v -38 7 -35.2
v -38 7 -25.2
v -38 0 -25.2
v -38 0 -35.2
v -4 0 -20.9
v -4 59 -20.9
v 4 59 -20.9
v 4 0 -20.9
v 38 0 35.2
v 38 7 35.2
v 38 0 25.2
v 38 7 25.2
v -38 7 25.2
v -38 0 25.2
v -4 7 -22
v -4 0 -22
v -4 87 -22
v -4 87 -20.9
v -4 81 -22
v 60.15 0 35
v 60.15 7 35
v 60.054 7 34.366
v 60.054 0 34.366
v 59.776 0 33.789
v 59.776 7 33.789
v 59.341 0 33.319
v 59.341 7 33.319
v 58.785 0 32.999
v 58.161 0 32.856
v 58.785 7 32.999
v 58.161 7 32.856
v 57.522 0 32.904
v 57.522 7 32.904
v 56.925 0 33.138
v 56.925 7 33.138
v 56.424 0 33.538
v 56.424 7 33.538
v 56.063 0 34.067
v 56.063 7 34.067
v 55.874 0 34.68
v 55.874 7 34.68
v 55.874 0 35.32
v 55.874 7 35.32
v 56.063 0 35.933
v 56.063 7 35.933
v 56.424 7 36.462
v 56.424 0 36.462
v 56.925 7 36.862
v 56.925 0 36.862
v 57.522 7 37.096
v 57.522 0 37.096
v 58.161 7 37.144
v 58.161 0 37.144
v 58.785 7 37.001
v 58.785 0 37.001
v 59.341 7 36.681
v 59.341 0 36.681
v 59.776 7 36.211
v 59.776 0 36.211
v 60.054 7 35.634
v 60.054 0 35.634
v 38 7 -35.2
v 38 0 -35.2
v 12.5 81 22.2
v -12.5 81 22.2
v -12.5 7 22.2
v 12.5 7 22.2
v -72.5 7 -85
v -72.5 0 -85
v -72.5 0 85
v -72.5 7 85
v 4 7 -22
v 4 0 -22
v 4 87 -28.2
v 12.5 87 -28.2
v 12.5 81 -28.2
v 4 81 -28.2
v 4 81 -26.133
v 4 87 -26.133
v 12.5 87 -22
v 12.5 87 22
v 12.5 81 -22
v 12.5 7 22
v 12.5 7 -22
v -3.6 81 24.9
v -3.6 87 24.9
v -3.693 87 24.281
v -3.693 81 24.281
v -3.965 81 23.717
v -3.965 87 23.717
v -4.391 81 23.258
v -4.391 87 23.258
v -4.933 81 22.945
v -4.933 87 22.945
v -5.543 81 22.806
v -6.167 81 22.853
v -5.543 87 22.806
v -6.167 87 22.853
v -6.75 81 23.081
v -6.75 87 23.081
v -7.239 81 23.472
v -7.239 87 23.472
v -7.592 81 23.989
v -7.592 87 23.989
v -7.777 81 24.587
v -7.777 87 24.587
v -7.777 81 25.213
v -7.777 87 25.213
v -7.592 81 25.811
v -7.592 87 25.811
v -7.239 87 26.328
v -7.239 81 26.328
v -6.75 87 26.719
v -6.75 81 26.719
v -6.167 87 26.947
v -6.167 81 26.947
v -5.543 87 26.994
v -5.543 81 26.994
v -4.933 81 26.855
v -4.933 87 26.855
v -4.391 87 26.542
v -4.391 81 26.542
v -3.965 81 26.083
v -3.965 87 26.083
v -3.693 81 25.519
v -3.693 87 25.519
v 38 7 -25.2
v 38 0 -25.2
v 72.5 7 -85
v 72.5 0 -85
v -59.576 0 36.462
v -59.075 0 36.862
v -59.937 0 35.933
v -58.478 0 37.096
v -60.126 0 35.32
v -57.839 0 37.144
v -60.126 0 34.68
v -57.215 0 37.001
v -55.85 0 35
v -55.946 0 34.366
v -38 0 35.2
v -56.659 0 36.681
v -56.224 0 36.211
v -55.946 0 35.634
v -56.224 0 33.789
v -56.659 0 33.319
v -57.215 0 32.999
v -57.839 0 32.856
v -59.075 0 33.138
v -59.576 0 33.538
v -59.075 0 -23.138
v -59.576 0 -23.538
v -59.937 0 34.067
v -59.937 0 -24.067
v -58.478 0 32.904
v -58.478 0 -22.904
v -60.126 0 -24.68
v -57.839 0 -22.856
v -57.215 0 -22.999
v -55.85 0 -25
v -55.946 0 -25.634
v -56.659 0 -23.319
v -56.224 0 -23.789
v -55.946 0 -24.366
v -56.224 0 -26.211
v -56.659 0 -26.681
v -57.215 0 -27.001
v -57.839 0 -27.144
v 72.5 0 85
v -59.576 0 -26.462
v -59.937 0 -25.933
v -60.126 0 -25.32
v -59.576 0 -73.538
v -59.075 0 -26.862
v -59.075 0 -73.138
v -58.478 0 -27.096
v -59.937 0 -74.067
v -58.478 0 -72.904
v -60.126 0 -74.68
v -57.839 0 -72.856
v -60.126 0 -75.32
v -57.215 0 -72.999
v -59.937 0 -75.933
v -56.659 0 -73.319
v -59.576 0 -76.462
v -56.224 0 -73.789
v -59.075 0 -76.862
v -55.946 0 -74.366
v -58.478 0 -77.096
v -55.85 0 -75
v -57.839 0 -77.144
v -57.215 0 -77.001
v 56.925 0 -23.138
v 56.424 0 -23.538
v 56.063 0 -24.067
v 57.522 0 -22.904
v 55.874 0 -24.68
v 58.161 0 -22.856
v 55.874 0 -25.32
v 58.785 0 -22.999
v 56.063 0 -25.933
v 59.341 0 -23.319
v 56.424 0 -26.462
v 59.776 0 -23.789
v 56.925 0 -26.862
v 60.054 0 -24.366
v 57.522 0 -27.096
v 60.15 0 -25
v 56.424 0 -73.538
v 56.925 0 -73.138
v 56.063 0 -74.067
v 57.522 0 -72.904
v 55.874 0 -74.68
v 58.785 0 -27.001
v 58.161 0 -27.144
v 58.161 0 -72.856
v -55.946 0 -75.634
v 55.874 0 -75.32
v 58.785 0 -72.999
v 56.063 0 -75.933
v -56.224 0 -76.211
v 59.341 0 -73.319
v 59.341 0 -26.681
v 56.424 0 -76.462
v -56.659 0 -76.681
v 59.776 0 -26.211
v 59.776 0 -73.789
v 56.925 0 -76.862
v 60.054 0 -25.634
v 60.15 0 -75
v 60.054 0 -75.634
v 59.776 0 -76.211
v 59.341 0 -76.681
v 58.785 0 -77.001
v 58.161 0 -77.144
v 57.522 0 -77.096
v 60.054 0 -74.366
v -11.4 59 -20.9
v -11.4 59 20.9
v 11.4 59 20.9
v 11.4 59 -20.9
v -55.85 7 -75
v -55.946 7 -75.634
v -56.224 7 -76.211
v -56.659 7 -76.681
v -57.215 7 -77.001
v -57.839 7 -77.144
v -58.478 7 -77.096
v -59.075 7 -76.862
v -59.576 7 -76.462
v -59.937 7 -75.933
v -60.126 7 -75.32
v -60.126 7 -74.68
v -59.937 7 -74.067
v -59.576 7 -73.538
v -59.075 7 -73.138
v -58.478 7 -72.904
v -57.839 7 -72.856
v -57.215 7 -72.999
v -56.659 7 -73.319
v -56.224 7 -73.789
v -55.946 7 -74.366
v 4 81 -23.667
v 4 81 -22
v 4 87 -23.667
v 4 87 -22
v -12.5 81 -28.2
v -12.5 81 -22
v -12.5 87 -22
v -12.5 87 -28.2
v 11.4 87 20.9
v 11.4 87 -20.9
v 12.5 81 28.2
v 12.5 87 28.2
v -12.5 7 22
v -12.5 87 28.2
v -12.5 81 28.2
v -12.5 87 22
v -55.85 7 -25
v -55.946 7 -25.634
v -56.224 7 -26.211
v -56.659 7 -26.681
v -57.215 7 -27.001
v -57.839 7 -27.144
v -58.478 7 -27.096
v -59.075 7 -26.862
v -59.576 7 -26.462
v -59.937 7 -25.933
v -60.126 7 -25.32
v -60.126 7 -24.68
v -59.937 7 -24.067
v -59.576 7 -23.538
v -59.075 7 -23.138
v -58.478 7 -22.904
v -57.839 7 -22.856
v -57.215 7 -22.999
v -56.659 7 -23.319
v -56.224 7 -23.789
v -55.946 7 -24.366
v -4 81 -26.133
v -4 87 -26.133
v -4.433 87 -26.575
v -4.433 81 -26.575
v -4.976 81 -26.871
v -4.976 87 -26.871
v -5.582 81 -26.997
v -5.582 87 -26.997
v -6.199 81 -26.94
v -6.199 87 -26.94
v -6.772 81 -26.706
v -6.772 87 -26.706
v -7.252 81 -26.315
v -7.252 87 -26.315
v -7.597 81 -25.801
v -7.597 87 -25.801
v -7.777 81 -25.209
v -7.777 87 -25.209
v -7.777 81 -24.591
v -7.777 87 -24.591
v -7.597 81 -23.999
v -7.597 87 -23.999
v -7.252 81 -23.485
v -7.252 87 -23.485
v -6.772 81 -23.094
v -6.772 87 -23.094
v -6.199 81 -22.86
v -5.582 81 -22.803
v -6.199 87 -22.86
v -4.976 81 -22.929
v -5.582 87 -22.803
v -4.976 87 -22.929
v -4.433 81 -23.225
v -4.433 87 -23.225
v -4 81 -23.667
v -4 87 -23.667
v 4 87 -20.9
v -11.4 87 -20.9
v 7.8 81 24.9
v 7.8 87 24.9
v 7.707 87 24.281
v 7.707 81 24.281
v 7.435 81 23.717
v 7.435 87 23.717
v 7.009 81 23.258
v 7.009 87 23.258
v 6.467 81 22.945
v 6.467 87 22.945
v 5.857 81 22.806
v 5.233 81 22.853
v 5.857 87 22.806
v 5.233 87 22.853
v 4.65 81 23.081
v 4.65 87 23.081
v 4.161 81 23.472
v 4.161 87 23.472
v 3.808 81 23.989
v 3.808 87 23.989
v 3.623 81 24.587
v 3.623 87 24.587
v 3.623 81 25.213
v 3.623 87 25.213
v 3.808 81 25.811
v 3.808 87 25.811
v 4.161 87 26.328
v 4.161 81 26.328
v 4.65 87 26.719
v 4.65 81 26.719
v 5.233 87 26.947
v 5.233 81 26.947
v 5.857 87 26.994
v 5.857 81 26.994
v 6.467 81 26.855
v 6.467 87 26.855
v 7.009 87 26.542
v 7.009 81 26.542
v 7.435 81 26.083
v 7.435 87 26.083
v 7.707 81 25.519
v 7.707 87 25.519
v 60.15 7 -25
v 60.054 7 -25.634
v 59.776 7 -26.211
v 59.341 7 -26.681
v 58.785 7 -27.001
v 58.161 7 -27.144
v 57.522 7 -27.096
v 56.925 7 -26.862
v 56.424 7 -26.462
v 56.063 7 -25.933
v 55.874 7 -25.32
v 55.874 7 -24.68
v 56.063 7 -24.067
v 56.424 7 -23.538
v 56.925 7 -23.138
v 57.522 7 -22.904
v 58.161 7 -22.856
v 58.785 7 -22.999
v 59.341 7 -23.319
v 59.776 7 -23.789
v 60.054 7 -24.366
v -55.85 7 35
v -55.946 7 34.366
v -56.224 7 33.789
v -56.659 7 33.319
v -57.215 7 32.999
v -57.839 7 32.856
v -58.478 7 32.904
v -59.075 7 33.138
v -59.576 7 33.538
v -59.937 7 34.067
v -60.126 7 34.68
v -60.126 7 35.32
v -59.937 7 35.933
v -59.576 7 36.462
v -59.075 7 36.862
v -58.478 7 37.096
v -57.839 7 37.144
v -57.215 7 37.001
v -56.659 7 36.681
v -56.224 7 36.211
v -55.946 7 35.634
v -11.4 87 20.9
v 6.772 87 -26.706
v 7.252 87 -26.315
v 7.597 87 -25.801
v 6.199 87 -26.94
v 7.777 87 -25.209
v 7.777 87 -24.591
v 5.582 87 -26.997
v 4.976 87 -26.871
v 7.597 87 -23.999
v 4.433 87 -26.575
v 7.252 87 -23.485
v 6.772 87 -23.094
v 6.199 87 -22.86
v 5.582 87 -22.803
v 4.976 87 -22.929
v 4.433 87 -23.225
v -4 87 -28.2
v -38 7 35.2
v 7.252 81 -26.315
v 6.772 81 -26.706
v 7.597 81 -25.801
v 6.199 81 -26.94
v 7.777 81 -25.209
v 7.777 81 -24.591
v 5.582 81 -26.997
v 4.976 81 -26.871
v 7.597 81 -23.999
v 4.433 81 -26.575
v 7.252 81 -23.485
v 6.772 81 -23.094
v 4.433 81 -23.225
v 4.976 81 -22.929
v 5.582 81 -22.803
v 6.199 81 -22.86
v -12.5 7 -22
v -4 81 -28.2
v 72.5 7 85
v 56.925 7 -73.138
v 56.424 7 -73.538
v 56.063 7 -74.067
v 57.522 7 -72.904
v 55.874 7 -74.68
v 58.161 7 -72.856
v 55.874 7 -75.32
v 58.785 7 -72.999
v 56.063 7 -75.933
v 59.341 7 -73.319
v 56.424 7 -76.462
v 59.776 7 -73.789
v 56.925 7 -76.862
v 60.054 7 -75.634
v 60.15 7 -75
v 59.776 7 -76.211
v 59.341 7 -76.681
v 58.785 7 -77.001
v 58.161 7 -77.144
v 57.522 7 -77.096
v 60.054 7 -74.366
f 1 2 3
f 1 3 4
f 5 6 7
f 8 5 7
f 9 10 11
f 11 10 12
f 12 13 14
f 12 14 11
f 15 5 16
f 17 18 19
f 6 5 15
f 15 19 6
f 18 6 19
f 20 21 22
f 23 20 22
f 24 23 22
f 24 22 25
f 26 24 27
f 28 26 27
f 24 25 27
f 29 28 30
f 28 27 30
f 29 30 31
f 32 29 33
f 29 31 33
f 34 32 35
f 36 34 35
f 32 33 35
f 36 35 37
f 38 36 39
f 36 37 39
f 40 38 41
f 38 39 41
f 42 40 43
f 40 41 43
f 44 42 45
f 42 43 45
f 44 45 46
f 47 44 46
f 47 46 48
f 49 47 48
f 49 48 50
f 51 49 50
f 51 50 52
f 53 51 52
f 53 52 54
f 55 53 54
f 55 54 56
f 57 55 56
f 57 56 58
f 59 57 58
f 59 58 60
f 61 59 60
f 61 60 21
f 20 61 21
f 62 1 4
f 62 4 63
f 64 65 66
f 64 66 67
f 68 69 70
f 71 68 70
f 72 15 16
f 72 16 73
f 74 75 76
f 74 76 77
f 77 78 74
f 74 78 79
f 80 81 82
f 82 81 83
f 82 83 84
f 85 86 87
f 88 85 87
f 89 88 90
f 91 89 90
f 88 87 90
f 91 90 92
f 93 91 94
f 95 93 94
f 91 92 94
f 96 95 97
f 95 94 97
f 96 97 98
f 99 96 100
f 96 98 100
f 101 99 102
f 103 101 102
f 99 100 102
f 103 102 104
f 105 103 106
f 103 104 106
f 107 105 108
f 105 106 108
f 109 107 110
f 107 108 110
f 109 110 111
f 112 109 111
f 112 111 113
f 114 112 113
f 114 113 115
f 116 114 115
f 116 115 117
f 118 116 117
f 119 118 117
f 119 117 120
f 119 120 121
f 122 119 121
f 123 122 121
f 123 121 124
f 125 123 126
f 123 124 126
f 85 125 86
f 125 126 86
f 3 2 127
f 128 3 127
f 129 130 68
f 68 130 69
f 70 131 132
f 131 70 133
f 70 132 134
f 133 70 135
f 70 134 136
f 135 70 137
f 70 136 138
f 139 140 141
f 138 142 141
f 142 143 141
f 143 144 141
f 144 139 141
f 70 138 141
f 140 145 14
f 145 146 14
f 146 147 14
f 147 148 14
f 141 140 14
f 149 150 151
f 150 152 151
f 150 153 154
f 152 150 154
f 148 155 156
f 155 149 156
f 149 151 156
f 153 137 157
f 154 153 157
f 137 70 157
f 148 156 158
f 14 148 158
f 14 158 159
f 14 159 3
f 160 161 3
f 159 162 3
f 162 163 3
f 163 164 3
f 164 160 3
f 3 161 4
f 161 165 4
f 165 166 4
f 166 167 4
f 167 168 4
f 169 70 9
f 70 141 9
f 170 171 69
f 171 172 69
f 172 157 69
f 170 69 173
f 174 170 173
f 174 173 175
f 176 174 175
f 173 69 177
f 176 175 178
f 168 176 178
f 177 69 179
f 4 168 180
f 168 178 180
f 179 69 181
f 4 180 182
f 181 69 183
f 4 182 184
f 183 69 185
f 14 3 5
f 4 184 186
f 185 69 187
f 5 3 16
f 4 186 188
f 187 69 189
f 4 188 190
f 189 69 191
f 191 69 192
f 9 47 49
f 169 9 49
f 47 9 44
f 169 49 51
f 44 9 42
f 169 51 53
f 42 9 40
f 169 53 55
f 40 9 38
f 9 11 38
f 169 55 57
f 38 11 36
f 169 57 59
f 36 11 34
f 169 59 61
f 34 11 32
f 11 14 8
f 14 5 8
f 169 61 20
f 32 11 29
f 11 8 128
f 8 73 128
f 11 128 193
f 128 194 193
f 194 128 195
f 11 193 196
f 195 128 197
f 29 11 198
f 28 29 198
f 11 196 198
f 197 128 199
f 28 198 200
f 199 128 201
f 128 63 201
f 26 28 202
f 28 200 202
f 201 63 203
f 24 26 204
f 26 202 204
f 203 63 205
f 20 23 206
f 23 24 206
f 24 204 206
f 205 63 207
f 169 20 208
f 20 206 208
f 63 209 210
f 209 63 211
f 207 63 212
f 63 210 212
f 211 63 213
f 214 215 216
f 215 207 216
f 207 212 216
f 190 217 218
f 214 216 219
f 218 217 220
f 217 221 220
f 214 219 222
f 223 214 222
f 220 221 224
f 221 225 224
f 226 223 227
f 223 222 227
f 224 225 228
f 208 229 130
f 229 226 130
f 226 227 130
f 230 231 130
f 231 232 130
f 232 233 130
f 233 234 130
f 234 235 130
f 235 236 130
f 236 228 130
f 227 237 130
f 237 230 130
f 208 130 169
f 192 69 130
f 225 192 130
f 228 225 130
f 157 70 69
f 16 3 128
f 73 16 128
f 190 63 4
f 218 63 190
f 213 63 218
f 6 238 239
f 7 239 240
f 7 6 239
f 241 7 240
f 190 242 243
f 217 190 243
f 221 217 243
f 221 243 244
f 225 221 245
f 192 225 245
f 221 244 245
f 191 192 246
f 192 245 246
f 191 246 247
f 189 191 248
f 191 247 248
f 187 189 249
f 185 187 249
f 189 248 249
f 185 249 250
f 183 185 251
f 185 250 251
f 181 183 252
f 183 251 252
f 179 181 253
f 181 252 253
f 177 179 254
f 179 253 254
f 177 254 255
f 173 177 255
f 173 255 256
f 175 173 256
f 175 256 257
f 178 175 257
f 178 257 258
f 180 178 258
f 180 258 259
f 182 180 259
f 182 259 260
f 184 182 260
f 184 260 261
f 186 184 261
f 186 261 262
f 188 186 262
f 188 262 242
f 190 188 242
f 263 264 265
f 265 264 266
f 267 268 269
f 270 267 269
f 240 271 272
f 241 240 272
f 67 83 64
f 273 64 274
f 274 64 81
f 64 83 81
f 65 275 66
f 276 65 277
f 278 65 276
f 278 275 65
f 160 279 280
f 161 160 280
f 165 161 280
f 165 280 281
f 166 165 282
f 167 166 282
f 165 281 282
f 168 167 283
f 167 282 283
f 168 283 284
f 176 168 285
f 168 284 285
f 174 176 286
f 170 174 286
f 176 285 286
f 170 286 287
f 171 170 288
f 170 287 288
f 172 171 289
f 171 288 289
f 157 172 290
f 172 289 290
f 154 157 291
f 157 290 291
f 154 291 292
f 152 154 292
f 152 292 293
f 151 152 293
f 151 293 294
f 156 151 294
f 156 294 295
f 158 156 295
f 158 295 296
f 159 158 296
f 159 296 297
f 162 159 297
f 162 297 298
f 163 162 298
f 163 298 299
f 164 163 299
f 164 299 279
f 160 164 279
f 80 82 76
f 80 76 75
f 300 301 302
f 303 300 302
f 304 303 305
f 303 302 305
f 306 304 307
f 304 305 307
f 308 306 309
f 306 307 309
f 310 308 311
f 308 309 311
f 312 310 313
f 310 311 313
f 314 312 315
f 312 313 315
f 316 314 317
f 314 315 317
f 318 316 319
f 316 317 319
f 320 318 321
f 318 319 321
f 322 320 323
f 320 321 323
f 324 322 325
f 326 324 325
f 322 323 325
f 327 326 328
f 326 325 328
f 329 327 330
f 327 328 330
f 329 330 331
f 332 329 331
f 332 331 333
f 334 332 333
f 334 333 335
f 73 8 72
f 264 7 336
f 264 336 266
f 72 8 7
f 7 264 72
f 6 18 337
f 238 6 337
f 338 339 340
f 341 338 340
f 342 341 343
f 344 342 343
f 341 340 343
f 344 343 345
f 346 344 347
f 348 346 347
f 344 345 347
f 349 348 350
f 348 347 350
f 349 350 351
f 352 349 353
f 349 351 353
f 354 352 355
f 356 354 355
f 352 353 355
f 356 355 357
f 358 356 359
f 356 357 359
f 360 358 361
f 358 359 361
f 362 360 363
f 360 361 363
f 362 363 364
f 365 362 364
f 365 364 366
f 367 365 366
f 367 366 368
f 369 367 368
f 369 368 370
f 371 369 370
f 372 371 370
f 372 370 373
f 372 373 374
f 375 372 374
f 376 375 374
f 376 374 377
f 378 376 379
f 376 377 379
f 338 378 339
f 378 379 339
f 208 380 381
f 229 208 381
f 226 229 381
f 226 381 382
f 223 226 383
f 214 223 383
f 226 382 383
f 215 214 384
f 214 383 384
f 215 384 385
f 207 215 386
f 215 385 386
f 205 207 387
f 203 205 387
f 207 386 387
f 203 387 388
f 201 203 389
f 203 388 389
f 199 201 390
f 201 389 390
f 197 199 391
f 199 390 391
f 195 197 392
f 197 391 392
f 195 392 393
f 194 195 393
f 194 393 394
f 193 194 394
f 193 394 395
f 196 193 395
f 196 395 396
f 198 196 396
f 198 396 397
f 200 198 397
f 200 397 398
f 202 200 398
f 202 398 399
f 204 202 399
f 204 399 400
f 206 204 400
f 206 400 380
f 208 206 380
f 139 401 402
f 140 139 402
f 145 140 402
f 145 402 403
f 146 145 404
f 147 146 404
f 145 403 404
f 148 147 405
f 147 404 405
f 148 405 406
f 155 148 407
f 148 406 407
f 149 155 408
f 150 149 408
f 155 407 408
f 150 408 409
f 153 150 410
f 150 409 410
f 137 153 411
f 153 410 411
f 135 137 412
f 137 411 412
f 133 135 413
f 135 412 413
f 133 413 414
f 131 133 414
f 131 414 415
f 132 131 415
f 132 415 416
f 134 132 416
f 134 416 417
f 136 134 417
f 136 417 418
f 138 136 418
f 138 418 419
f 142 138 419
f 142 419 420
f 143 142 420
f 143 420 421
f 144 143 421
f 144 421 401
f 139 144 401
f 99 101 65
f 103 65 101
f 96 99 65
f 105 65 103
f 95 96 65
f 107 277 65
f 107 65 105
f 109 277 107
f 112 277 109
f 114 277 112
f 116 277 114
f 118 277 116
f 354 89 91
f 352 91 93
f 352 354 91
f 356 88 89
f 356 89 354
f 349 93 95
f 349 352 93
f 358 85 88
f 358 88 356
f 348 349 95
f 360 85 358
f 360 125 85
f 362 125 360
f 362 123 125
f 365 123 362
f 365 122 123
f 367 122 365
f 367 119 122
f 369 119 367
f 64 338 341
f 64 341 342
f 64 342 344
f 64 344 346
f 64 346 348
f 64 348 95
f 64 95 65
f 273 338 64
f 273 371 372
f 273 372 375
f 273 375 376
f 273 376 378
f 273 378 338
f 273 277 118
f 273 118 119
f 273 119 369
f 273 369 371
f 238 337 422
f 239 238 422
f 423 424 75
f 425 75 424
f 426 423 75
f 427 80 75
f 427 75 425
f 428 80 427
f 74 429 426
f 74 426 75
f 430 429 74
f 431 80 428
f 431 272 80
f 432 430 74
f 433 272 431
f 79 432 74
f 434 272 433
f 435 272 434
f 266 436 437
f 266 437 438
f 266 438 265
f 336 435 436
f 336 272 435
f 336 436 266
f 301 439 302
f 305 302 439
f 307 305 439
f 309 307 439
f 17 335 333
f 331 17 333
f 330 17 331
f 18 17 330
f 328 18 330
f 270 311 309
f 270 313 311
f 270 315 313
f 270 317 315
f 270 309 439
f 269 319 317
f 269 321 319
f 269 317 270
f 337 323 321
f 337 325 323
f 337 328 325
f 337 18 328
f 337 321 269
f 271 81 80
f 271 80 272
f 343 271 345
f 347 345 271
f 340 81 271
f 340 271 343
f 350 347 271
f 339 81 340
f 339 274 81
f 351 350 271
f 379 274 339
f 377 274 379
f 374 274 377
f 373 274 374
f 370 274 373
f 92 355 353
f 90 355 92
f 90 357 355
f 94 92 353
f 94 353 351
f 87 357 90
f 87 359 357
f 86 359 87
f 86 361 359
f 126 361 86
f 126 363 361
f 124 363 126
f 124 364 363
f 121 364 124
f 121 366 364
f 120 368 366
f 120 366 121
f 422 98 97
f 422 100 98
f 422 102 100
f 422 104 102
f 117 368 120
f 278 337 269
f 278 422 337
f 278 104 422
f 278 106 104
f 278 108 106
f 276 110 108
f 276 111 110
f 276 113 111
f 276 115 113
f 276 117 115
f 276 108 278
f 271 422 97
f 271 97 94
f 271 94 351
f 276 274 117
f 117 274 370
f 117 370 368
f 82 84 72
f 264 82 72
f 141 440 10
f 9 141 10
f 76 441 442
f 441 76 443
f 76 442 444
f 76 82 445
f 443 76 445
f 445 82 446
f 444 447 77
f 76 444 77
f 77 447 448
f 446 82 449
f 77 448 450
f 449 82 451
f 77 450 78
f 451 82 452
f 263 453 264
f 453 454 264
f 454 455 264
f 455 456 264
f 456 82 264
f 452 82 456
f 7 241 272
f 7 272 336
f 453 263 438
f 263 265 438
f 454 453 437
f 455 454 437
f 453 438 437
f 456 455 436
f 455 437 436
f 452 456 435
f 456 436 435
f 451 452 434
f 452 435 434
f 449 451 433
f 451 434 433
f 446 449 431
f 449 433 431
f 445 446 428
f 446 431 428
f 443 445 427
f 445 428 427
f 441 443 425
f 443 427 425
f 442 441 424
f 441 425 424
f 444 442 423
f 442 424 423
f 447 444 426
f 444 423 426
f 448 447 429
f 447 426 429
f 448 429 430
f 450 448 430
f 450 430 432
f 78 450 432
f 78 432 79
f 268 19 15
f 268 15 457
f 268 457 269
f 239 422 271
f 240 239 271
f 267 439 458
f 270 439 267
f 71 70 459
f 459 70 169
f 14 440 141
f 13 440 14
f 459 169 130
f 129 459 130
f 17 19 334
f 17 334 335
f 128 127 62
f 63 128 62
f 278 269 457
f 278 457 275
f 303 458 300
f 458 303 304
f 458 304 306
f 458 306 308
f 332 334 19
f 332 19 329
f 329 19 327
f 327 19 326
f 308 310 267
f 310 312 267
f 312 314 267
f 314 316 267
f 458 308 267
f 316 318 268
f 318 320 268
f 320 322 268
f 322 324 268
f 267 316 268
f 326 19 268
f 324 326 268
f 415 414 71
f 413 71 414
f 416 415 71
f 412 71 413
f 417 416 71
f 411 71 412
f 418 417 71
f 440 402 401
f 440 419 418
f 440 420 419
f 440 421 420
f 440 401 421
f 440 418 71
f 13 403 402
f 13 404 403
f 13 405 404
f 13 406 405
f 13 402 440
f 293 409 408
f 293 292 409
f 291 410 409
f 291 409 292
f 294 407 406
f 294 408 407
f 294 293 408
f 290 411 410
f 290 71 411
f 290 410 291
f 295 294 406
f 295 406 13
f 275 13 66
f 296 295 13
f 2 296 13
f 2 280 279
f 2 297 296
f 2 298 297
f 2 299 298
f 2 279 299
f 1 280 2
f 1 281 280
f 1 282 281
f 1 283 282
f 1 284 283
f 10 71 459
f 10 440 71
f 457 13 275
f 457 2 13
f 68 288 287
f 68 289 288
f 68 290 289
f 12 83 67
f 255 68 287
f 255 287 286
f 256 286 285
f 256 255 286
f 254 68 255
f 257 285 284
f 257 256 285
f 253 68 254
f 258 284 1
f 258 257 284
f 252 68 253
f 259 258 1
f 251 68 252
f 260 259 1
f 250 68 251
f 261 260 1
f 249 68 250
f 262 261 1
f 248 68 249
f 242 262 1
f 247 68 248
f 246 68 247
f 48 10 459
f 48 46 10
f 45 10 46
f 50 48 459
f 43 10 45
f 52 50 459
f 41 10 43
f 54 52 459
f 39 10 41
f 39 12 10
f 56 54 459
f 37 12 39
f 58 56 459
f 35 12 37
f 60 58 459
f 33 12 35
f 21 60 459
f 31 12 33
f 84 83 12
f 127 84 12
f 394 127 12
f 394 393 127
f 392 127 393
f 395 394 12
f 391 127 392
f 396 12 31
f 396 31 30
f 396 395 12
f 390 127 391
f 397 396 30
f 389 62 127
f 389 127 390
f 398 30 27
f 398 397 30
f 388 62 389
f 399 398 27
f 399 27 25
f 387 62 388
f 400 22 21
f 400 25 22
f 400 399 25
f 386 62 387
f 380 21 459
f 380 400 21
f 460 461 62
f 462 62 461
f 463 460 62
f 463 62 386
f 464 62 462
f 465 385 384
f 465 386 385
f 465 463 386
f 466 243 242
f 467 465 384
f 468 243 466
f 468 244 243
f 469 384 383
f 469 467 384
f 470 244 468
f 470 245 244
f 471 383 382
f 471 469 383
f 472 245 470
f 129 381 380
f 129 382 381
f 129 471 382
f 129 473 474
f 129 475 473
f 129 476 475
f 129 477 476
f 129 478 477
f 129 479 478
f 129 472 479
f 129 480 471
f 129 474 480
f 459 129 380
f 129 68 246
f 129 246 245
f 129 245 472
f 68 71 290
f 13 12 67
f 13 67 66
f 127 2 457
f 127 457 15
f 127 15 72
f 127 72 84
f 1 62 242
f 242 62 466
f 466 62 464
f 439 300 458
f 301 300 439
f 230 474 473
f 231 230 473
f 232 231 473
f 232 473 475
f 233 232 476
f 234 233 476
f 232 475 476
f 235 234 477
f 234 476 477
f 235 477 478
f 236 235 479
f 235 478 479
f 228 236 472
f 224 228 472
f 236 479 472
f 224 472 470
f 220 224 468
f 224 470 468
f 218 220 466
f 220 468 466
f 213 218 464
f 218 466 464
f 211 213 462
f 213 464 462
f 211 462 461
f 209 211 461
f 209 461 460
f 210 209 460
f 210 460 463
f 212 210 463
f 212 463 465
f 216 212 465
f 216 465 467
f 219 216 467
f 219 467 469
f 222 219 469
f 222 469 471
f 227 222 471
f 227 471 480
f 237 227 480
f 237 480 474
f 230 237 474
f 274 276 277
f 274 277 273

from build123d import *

# Parameters (mm, degrees)
BOSS_EXTRUDE1_DEPTH = 7
BOSS_EXTRUDE2_DEPTH = 80
CUT_EXTRUDE1_DEPTH  = 28
SKETCH4_W           = 8
SKETCH4_H           = 1.100013063
CUT_EXTRUDE2_DEPTH  = 88
SKETCH5_W           = 25
SKETCH5_H           = 80
BOSS_EXTRUDE3_DEPTH = 6.2
SKETCH8_R           = 2.1
CUT_EXTRUDE3_DEPTH  = 6
SKETCH13_W          = 25
SKETCH13_H          = 74
CUT_EXTRUDE11_DEPTH = 6
SKETCH15_W          = 8.5
SKETCH15_H          = 6
BOSS_EXTRUDE6_DEPTH = 6.2
SKETCH16_R          = 2.1
CUT_EXTRUDE12_DEPTH = 6.2
SKETCH17_R          = 2.15
CUT_EXTRUDE13_DEPTH = 8
SKETCH18_W          = 76
SKETCH18_H          = 10
CUT_EXTRUDE14_DEPTH = 8


with BuildPart() as part:
    # Sketch1 → Boss-Extrude1 (new body)
    with BuildSketch(Plane(origin=(0, 0, 0), x_dir=(1, 0, 0), z_dir=(0, 1, 0))):
        Polygon((-72.5, -85), (72.5, -85), (72.5, 85), (12.5, 85), (-12.5, 85), (-72.5, 85), align=None)
    extrude(amount=BOSS_EXTRUDE1_DEPTH)

    # Sketch2 → Boss-Extrude2 (add)
    with BuildSketch(Plane(origin=(0, 7, 0), x_dir=(1, 0, 0), z_dir=(0, 1, 0))):
        Polygon((12.5, 21.999959178), (-12.5, 22), (-12.499999895, -22), (12.500000105, -22.000040822), align=None)
    extrude(amount=BOSS_EXTRUDE2_DEPTH)

    # Sketch3 → Cut-Extrude1 (cut)
    with BuildSketch(Plane(origin=(0, 87, 0), x_dir=(1, 0, 0), z_dir=(0, 1, 0))):
        Polygon((-11.399999997, 20.899998204), (-11.399999897, -20.900001796), (11.400000102, -20.900039025), (11.400000003, 20.899960975), align=None)
    extrude(amount=-CUT_EXTRUDE1_DEPTH, mode=Mode.SUBTRACT)

    # Sketch4 → Cut-Extrude2 (cut, through all)
    with BuildSketch(Plane(origin=(0, 87, 0), x_dir=(1, 0, 0), z_dir=(0, 1, 0))):
        with Locations((0, 21.44997959)):
            Rectangle(SKETCH4_W, SKETCH4_H)
    extrude(amount=-CUT_EXTRUDE2_DEPTH, mode=Mode.SUBTRACT)

    # Sketch5 → Boss-Extrude3 (add)
    with BuildSketch(Plane(origin=(-3.5923e-05, 0, 22.000020411), x_dir=(1, 0, 1.633e-06), z_dir=(-1.633e-06, 0, 1))):
        with Locations((3.6028e-05, 47)):
            Rectangle(SKETCH5_W, SKETCH5_H)
    extrude(amount=BOSS_EXTRUDE3_DEPTH)

    # Sketch8 → Cut-Extrude3 (cut)
    with BuildSketch(Plane(origin=(0, 87, 0), x_dir=(1, 0, 0), z_dir=(0, 1, 0))):
        with Locations((5.700000051, -24.900029718)):
            Circle(SKETCH8_R)
        with Locations((-5.700000051, -24.900029718)):
            Circle(SKETCH8_R)
    extrude(amount=-CUT_EXTRUDE3_DEPTH, mode=Mode.SUBTRACT)

    # Sketch13 → Cut-Extrude11 (cut)
    with BuildSketch(Plane(origin=(-4.6047e-05, 0, 28.200020411), x_dir=(1, 0, 1.633e-06), z_dir=(-1.633e-06, 0, 1))):
        with Locations((3.6028e-05, 44)):
            Rectangle(SKETCH13_W, SKETCH13_H)
    extrude(amount=-CUT_EXTRUDE11_DEPTH, mode=Mode.SUBTRACT)

    # Sketch15 → Boss-Extrude6 (add)
    with BuildSketch(Plane(origin=(3.5923e-05, 0, -21.999979589), x_dir=(-1, 0, -1.633e-06), z_dir=(1.633e-06, 0, -1))):
        with Locations((-8.249964077, 84)):
            Rectangle(SKETCH15_W, SKETCH15_H)
        with Locations((8.249964077, 84)):
            Rectangle(SKETCH15_W, SKETCH15_H)
    extrude(amount=BOSS_EXTRUDE6_DEPTH)

    # Sketch16 → Cut-Extrude12 (cut)
    with BuildSketch(Plane(origin=(0, 87, 0), x_dir=(1, 0, 0), z_dir=(0, 1, 0))):
        with Locations((5.700000051, -24.900029718)):
            Circle(SKETCH16_R)
        with Locations((-5.700000051, -24.900029718)):
            Circle(SKETCH16_R)
        with Locations((5.700000051, 24.900029718)):
            Circle(SKETCH16_R)
        with Locations((-5.700000051, 24.900029718)):
            Circle(SKETCH16_R)
    extrude(amount=-CUT_EXTRUDE12_DEPTH, mode=Mode.SUBTRACT)

    # Sketch17 → Cut-Extrude13 (cut, through all)
    with BuildSketch(Plane(origin=(0, 7, 0), x_dir=(1, 0, 0), z_dir=(0, 1, 0))):
        with Locations((-58, 75)):
            Circle(SKETCH17_R)
        with Locations((-58, 25)):
            Circle(SKETCH17_R)
        with Locations((-58, -35)):
            Circle(SKETCH17_R)
        with Locations((58, -35)):
            Circle(SKETCH17_R)
        with Locations((58, 25)):
            Circle(SKETCH17_R)
        with Locations((58, 75)):
            Circle(SKETCH17_R)
    extrude(amount=-CUT_EXTRUDE13_DEPTH, mode=Mode.SUBTRACT)

    # Sketch18 → Cut-Extrude14 (cut, through all)
    with BuildSketch(Plane(origin=(0, 7, 0), x_dir=(1, 0, 0), z_dir=(0, 1, 0))):
        with Locations((0, 30.200020411)):
            Rectangle(SKETCH18_W, SKETCH18_H)
        with Locations((0, -30.200020411)):
            Rectangle(SKETCH18_W, SKETCH18_H)
    extrude(amount=-CUT_EXTRUDE14_DEPTH, mode=Mode.SUBTRACT)


solid = part.part
